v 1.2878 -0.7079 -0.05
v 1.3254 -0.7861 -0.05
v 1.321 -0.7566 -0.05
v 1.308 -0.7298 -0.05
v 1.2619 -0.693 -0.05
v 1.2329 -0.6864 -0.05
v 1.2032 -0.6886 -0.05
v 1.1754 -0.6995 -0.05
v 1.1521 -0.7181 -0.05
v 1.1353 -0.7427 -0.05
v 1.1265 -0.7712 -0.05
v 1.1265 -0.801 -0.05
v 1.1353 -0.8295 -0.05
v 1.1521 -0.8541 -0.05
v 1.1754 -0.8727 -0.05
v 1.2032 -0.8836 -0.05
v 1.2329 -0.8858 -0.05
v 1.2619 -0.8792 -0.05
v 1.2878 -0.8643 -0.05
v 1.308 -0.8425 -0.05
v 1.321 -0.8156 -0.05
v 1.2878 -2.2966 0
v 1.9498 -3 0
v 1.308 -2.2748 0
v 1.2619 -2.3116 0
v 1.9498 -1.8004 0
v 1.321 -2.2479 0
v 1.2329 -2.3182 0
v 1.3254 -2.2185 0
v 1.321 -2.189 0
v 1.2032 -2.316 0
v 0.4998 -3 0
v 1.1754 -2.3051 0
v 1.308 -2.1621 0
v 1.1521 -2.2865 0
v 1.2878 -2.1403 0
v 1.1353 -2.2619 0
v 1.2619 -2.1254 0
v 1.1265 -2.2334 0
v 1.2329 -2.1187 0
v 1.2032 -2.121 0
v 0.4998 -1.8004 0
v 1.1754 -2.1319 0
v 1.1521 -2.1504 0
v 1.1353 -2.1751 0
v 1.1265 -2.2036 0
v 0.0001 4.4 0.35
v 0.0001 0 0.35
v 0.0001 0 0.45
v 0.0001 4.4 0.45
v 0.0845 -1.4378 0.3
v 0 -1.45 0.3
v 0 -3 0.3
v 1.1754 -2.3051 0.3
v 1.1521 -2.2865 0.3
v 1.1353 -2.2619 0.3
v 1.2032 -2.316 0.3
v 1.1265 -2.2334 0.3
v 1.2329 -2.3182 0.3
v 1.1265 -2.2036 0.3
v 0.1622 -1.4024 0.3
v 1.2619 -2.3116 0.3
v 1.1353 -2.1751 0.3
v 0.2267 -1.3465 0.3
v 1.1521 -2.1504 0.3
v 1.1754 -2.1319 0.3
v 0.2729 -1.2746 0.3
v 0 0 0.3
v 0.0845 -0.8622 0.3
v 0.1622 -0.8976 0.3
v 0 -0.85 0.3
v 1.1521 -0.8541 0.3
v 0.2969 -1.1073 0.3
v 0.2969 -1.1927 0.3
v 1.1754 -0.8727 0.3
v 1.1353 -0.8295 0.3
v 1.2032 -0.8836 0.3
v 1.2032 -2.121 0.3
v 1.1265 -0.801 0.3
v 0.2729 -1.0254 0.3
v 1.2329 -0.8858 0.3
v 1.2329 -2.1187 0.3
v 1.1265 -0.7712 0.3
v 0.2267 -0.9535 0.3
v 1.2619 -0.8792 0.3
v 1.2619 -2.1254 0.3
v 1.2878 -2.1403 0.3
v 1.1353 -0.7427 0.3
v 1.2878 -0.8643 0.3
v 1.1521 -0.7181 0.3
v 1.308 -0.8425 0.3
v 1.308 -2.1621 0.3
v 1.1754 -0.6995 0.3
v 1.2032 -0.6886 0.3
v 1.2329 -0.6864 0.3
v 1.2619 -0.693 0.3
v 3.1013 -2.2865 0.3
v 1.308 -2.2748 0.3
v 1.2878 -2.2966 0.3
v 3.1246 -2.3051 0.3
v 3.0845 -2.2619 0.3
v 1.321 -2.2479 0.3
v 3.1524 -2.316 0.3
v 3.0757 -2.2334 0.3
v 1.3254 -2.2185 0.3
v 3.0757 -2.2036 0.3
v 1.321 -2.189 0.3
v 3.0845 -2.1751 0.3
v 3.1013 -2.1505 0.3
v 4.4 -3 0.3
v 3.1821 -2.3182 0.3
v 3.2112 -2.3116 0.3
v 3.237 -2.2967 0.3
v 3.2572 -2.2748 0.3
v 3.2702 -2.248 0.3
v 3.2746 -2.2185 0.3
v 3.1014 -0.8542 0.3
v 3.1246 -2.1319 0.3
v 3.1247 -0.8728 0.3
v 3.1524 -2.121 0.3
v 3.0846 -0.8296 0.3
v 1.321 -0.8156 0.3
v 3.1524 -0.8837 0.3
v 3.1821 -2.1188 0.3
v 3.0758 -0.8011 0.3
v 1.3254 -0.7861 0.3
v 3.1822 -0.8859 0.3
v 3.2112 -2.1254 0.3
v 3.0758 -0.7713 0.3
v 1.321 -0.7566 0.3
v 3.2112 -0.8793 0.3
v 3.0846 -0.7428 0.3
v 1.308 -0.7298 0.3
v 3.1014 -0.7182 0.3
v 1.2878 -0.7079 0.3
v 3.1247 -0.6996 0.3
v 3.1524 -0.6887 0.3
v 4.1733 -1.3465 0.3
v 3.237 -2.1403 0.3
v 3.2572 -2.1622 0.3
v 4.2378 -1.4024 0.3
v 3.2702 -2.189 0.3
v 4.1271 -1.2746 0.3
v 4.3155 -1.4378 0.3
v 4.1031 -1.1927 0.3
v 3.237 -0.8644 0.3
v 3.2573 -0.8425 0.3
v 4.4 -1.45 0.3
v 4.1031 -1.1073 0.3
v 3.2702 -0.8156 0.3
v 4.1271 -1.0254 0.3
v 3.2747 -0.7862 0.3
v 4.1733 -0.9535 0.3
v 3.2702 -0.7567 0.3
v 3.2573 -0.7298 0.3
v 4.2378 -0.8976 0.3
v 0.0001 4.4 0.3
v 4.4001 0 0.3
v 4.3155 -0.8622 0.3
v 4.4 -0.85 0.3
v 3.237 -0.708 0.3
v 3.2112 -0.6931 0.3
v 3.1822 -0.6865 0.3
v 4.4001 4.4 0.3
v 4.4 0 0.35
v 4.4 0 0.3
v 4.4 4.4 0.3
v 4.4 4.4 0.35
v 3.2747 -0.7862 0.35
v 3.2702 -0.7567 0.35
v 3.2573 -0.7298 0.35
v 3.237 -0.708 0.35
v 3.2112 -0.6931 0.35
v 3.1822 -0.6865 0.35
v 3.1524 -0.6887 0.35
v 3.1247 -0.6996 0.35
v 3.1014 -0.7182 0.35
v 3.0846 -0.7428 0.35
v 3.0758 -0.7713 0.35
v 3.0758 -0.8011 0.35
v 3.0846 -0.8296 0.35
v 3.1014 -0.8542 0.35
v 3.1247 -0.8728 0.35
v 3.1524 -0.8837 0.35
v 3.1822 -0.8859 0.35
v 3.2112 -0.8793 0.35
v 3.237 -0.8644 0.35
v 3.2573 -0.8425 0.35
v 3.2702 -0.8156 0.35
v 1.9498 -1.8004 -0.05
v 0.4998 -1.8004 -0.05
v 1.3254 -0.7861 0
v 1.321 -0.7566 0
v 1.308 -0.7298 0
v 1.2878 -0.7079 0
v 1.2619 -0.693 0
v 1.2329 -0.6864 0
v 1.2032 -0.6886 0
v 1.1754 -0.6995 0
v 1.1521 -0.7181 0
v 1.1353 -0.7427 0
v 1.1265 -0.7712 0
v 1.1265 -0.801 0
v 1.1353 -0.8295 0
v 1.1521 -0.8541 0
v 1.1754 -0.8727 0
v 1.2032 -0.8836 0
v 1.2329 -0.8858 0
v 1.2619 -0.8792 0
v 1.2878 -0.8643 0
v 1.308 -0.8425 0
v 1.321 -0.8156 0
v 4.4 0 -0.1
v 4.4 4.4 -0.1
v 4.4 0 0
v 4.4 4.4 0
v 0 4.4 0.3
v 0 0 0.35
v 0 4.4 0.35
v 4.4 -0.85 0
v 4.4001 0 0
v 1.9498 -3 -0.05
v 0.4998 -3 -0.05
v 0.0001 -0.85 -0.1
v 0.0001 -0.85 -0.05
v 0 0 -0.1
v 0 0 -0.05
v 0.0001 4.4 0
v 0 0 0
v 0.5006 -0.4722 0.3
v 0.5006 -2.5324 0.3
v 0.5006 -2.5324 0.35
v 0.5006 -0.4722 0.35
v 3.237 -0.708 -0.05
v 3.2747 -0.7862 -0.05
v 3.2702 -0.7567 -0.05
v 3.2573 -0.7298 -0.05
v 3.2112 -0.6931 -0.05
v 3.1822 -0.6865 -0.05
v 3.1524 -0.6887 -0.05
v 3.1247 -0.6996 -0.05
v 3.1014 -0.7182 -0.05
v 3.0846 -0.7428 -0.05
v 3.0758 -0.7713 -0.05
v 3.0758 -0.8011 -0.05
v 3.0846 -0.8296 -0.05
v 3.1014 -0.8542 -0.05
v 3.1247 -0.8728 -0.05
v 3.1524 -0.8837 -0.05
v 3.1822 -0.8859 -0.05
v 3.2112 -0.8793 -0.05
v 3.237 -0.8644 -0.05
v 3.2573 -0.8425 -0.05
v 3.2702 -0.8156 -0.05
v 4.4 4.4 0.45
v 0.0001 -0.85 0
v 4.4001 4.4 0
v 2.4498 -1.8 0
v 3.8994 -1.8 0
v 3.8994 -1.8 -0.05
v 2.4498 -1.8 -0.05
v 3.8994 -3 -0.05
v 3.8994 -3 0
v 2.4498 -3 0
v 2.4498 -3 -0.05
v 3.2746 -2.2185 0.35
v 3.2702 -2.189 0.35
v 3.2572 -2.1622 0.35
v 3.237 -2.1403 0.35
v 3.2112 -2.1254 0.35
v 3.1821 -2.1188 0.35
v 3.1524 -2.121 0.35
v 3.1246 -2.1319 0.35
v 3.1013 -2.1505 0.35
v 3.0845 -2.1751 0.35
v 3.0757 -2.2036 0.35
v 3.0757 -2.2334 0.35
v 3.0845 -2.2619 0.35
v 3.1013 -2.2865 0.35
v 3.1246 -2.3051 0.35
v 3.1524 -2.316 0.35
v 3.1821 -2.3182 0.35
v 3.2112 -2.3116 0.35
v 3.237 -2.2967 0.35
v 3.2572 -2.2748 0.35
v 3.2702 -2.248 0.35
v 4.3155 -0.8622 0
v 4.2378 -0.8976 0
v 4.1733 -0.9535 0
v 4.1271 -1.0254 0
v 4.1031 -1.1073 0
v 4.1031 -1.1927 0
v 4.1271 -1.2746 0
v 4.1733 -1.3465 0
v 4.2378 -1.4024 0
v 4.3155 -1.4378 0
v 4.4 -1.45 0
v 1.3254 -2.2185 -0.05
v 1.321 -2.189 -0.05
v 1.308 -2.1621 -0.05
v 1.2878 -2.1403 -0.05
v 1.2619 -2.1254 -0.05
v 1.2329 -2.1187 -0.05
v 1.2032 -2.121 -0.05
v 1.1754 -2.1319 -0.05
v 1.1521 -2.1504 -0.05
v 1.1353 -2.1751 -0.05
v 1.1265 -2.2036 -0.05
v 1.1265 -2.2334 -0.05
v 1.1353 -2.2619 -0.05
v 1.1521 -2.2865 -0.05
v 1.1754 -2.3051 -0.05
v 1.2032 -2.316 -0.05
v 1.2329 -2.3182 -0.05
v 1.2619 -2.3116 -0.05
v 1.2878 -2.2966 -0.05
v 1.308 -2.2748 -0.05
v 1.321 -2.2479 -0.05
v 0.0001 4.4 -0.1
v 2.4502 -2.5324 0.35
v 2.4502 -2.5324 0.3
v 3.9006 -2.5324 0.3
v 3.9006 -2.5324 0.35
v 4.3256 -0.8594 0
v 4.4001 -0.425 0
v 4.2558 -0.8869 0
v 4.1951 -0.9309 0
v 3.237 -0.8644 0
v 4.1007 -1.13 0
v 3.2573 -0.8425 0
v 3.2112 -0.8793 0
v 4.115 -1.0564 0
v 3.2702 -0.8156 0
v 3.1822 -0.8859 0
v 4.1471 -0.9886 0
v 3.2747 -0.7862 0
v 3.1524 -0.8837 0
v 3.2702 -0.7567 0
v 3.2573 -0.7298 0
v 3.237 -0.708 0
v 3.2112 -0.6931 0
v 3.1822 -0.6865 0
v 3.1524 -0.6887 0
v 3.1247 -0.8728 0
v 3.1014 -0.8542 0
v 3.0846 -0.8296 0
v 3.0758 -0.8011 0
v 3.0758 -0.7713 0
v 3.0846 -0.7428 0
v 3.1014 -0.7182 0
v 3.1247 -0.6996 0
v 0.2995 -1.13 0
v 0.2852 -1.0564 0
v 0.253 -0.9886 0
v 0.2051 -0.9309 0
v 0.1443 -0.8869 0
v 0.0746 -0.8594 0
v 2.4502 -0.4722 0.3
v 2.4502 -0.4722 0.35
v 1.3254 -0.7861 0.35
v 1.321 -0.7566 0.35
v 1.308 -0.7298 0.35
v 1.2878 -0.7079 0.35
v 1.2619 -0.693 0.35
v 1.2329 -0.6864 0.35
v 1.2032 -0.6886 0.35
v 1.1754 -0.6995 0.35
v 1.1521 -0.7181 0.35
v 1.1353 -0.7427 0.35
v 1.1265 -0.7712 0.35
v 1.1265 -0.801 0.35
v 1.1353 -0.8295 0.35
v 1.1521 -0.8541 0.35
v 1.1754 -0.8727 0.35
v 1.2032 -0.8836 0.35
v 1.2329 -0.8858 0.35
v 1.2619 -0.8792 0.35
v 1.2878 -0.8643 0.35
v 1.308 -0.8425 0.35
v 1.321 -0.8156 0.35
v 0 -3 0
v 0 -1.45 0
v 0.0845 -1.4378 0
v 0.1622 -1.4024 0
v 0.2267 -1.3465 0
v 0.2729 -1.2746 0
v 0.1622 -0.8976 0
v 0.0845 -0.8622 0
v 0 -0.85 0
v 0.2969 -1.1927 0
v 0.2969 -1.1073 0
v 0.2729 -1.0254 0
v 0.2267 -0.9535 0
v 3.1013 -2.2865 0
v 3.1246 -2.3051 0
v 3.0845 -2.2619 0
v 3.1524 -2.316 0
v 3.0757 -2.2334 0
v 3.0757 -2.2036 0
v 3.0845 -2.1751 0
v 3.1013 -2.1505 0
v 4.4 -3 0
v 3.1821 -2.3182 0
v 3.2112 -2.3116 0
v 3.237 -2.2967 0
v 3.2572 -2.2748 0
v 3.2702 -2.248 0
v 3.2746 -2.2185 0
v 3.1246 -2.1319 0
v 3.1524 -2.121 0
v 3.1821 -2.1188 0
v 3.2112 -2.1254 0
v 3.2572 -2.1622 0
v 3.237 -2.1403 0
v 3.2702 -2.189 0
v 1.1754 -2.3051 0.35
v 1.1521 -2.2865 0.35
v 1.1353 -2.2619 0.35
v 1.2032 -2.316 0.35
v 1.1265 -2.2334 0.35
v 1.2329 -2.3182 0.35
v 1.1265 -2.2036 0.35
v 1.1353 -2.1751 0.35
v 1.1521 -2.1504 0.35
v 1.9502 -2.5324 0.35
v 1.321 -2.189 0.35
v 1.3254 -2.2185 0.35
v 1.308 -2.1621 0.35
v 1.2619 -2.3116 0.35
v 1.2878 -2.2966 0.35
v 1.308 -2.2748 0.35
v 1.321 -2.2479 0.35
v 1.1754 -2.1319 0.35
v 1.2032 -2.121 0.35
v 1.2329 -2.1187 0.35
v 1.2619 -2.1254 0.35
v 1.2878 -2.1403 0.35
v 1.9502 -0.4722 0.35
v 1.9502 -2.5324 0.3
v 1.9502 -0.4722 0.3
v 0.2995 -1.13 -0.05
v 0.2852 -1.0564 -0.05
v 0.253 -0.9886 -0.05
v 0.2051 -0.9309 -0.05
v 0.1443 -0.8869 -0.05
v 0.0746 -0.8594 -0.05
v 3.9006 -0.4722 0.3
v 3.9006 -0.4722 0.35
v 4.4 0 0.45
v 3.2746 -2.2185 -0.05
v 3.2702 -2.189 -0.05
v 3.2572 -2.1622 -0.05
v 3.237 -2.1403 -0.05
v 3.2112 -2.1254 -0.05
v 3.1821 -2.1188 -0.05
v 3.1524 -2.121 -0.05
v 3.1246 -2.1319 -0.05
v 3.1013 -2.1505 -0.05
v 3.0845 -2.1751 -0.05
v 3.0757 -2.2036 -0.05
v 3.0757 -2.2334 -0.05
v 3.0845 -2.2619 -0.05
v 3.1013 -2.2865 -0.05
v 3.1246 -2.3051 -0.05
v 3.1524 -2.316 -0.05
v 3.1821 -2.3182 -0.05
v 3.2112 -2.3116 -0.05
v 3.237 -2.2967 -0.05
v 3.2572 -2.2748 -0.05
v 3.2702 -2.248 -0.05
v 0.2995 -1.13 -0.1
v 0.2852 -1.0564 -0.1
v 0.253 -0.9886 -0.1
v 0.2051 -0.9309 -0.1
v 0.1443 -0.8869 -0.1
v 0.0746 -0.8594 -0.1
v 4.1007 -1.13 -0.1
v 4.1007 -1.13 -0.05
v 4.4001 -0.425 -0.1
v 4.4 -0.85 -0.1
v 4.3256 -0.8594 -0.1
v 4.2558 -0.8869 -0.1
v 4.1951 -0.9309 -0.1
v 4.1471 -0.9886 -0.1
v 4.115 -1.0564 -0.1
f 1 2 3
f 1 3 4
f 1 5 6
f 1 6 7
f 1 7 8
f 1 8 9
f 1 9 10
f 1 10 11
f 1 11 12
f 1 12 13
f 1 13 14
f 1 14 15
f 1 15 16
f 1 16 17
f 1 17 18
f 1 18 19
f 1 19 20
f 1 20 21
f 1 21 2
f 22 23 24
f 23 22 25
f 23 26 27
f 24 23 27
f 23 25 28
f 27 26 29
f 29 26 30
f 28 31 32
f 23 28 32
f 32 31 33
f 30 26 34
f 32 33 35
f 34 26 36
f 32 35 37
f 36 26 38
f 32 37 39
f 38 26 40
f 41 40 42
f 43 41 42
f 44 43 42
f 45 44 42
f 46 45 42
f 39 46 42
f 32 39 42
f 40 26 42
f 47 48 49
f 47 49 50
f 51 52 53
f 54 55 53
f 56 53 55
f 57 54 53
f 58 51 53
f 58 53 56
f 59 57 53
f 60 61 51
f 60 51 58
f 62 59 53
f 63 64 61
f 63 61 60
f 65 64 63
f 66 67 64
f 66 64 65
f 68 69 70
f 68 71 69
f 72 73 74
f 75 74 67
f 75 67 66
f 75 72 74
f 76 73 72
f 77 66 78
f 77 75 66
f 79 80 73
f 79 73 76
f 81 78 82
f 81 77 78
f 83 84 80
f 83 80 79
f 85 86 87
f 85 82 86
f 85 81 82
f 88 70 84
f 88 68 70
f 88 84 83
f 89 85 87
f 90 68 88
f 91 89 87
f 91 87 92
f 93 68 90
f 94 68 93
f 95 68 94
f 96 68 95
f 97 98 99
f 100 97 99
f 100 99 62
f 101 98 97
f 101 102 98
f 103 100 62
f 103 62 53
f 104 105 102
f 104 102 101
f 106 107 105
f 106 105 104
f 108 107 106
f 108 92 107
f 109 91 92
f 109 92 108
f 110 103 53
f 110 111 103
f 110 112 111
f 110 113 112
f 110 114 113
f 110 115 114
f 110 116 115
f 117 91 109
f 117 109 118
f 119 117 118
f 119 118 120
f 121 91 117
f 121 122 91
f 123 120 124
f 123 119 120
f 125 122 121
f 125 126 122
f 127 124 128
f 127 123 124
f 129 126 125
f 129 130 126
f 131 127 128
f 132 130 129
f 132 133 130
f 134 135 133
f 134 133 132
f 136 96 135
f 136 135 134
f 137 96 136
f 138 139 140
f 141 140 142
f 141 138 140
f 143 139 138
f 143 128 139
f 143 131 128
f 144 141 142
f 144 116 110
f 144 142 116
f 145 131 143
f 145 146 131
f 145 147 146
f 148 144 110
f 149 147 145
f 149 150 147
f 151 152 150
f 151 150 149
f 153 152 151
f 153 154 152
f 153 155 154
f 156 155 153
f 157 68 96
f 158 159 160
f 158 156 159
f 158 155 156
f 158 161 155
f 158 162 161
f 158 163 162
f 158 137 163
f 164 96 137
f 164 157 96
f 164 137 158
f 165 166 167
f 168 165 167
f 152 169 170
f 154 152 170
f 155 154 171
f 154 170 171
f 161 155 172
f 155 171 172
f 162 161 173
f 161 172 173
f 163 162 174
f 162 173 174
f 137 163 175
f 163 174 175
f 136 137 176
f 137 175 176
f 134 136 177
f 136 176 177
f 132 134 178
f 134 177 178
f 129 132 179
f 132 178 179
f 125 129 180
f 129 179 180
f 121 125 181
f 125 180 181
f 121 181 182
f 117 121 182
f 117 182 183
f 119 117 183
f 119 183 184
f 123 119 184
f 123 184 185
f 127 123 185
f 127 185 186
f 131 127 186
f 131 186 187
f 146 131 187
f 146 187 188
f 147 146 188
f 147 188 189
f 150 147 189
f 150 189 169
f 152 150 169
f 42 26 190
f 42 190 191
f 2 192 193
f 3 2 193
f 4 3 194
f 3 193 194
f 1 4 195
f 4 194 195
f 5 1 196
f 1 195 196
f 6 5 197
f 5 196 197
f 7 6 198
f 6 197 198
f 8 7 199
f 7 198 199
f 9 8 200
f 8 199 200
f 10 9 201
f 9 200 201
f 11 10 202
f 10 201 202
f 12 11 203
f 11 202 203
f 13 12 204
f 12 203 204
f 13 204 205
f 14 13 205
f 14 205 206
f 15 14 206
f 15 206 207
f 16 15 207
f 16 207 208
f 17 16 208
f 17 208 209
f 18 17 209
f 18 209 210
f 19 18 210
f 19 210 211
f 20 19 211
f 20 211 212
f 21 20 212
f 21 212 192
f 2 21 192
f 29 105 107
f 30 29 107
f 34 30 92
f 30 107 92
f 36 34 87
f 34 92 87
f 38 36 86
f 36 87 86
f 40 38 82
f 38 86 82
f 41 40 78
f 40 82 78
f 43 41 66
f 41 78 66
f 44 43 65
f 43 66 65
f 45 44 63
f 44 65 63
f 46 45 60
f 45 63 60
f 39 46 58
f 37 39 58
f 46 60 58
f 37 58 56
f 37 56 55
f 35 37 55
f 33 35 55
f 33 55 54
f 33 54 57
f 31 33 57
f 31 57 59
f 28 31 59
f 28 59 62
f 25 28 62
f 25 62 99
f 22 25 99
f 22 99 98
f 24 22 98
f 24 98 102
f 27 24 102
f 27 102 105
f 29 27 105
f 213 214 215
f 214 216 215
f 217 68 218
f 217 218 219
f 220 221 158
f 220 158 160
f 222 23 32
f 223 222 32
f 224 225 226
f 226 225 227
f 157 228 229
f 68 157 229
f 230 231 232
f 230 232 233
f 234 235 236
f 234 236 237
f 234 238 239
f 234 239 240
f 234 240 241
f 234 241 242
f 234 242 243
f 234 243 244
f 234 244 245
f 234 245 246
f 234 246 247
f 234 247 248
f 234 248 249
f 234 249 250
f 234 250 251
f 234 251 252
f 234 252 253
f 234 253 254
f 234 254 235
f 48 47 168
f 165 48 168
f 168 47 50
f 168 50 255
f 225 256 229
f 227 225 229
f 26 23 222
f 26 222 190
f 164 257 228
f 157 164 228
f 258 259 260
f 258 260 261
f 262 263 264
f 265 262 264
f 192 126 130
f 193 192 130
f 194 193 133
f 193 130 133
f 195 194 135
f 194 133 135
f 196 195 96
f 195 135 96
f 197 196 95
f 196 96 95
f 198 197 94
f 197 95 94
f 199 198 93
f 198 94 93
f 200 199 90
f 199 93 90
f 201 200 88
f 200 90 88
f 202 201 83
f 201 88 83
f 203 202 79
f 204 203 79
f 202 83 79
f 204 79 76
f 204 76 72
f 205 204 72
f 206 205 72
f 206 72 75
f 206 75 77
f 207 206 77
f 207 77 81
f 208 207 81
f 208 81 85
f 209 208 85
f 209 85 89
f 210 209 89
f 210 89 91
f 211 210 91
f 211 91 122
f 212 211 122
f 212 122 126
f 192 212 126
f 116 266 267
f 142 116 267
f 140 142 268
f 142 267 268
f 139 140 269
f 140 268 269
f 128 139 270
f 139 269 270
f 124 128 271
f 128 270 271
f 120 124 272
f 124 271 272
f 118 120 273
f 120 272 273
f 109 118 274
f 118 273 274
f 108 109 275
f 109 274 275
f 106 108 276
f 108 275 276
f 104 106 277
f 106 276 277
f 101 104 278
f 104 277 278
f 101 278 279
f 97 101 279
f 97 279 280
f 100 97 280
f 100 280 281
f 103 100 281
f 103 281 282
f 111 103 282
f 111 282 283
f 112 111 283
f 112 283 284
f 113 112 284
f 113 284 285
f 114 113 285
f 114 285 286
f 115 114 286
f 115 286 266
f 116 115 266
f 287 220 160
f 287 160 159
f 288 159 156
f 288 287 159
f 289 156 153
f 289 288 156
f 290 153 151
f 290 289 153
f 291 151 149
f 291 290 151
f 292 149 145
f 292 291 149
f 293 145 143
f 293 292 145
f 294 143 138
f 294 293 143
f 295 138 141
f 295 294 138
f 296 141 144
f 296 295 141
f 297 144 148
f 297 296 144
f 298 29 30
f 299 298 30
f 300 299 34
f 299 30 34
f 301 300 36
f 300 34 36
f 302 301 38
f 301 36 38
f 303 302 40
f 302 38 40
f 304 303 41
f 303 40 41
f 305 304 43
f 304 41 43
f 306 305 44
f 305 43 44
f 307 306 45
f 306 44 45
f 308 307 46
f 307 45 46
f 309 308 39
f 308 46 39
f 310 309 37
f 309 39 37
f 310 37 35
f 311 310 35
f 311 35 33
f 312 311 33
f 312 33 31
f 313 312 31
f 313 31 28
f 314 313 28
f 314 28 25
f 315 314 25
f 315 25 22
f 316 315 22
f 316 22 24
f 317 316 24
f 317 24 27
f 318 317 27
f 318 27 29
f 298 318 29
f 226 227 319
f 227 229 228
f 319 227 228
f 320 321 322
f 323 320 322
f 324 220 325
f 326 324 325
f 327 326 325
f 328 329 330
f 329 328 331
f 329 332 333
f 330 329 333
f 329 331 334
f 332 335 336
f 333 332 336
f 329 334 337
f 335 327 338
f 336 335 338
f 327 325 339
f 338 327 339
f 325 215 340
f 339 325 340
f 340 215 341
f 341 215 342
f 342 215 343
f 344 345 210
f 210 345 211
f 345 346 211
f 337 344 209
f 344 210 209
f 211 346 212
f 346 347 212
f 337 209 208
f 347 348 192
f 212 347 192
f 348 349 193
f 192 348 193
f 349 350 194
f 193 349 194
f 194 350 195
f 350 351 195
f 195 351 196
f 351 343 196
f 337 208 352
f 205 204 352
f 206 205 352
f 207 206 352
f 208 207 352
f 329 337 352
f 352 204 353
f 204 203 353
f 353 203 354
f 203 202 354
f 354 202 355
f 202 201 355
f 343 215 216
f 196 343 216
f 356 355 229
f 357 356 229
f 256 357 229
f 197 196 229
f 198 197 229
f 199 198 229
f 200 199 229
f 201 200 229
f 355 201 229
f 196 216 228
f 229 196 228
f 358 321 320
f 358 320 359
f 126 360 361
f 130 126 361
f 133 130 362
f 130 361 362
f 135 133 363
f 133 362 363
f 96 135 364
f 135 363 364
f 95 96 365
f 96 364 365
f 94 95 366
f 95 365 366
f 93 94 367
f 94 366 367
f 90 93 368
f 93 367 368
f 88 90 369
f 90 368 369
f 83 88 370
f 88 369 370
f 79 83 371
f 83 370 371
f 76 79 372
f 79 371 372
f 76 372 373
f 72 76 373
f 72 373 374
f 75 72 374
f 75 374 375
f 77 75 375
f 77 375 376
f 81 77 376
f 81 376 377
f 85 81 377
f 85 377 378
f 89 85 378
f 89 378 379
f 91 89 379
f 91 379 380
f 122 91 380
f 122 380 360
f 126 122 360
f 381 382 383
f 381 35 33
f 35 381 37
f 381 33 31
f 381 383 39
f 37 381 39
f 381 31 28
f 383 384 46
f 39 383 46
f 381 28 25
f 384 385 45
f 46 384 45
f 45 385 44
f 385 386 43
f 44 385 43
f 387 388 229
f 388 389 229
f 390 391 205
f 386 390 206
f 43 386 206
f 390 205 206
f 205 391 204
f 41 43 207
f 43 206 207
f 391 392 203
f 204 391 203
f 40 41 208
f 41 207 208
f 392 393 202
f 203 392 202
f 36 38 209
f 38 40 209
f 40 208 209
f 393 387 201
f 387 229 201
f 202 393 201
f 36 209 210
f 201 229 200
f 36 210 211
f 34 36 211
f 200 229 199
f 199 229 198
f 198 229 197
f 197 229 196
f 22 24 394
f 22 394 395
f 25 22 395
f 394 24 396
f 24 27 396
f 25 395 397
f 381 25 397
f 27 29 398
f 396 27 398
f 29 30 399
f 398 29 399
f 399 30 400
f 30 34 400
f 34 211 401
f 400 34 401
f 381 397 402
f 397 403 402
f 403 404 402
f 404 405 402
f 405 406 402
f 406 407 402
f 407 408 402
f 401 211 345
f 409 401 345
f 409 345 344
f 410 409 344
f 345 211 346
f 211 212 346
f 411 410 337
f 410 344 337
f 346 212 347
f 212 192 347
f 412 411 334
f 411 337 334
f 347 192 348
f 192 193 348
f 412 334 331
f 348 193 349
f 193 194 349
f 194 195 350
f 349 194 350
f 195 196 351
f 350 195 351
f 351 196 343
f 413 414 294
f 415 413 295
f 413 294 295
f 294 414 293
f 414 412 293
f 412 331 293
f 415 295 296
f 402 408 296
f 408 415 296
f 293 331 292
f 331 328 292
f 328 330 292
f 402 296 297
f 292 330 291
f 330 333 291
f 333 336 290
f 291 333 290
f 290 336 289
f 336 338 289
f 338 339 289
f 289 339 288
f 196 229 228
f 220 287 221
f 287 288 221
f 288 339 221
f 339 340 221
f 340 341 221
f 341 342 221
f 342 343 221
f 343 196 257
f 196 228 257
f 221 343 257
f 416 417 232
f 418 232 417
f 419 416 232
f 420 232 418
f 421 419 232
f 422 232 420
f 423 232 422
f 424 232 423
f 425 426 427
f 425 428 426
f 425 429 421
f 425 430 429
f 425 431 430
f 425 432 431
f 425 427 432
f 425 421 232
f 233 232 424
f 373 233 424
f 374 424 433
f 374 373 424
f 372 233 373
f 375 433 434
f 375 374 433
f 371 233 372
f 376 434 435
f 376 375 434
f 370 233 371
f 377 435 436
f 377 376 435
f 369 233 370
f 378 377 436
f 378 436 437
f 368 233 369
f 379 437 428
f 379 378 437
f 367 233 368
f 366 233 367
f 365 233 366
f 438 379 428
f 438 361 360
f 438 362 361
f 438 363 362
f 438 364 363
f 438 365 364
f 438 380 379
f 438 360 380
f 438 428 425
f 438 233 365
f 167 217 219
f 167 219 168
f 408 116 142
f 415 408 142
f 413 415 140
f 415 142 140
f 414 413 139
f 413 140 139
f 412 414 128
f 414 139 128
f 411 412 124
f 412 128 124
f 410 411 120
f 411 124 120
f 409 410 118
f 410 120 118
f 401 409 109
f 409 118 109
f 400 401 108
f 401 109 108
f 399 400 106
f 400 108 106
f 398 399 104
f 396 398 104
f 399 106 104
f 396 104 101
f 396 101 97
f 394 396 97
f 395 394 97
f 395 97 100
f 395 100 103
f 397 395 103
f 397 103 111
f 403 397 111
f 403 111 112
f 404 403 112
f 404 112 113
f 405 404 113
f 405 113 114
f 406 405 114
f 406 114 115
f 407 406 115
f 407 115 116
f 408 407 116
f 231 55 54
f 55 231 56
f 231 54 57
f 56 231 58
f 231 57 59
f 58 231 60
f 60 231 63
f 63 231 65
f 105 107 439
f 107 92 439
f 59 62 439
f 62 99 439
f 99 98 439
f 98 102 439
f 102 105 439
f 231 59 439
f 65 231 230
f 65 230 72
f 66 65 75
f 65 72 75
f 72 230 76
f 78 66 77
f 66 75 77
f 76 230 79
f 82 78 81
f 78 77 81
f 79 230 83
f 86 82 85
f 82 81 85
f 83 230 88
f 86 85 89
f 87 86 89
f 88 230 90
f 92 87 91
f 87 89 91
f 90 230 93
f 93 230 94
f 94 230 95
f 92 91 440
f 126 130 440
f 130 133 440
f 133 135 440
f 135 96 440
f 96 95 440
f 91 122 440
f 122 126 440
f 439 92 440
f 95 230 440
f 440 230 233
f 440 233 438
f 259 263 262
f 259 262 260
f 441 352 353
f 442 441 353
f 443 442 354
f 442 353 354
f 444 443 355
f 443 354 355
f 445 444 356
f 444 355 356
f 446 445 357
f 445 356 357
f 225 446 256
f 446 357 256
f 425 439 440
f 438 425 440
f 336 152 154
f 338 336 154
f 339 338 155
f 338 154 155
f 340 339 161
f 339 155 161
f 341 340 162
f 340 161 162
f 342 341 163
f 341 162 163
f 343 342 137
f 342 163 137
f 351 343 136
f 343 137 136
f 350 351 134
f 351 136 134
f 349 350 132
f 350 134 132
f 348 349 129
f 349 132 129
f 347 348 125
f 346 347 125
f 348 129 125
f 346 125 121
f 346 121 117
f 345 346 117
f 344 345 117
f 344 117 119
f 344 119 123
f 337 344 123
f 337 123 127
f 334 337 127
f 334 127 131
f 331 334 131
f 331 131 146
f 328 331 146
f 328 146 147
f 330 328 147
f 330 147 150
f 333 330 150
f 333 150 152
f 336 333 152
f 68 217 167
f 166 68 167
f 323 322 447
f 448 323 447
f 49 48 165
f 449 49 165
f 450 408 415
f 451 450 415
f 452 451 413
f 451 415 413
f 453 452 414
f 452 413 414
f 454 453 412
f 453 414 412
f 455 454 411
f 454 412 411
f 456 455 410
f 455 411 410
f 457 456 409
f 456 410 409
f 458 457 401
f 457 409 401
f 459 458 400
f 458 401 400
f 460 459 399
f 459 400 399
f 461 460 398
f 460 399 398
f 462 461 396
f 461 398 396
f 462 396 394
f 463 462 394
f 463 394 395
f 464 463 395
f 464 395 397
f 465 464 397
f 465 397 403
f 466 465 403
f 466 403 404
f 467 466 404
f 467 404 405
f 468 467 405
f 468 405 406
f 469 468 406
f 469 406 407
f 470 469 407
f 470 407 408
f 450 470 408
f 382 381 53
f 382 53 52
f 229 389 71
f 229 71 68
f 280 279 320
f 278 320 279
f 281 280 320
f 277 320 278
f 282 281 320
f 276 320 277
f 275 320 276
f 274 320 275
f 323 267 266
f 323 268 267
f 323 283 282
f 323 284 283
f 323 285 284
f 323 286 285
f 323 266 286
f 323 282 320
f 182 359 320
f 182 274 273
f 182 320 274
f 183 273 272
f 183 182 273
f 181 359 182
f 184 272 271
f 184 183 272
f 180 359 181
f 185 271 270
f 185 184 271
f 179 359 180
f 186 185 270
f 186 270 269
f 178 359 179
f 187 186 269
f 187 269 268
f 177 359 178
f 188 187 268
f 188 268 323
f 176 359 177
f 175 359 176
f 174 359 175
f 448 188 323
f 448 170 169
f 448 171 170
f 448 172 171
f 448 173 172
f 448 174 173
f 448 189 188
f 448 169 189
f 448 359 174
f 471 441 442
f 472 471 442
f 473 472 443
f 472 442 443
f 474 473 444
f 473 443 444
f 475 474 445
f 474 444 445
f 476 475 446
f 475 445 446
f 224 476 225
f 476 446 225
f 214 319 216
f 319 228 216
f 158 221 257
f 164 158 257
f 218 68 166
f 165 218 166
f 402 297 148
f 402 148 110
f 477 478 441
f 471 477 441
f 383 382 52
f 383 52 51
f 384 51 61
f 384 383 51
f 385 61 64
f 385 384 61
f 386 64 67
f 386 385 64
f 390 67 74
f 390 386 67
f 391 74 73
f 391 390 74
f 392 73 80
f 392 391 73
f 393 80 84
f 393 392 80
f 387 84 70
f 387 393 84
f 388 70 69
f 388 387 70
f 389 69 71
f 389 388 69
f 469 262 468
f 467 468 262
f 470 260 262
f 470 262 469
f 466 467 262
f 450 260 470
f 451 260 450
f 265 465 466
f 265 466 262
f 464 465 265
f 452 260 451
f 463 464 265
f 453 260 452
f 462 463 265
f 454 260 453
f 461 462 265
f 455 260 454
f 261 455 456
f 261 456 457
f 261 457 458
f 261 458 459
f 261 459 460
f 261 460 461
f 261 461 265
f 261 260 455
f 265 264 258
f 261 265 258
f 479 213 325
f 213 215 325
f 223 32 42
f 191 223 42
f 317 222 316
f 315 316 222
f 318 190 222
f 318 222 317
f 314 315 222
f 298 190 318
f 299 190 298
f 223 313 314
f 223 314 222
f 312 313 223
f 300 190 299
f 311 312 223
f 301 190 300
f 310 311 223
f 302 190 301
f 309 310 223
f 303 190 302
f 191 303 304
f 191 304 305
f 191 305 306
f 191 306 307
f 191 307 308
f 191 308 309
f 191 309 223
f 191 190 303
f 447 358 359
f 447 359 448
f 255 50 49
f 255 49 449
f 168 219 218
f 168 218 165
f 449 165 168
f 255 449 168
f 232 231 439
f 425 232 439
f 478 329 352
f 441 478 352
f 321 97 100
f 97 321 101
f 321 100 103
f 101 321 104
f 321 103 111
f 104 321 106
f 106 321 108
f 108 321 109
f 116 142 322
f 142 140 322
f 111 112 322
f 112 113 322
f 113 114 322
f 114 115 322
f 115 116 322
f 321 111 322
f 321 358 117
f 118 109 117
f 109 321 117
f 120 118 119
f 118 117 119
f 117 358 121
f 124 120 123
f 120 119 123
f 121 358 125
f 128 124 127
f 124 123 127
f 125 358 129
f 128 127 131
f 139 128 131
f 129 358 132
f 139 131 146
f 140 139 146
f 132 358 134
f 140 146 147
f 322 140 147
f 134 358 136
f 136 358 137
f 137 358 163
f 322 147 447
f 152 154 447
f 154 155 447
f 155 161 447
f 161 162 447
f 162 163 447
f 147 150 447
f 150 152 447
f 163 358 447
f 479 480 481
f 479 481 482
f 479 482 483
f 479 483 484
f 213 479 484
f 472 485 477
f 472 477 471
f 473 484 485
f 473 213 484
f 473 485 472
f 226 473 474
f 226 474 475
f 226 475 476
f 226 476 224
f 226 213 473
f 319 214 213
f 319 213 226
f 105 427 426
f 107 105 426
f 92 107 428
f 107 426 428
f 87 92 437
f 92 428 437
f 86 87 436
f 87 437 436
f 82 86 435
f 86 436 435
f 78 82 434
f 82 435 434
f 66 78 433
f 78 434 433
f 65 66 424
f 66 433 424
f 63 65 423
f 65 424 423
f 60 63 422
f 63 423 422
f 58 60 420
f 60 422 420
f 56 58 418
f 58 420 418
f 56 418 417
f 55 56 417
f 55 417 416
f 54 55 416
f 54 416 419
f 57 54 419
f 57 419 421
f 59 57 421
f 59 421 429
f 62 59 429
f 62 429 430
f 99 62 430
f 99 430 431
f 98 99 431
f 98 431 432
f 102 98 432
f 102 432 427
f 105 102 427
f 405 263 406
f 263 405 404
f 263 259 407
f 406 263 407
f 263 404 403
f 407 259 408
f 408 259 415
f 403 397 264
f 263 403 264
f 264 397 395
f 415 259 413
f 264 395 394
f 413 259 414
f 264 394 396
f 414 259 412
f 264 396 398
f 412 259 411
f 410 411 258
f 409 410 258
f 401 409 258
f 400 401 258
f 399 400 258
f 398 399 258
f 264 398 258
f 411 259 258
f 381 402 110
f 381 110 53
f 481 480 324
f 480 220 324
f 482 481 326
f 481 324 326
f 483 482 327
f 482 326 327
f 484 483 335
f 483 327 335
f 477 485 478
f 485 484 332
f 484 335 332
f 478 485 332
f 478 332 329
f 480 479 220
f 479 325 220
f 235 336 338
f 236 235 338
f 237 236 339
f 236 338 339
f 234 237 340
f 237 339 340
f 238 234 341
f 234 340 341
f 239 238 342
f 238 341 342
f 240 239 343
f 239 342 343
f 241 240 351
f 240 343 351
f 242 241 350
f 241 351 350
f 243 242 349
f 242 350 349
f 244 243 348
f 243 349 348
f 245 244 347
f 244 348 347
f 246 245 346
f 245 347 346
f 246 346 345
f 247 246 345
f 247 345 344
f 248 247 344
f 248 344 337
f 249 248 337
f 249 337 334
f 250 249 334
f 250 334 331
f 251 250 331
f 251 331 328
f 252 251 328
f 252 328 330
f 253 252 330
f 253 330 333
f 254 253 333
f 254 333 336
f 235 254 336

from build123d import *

# Parameters (mm, degrees)
BOSS_EXTRUDE1_DEPTH   = 0.3
BOSS_EXTRUDE2_DEPTH   = 0.05
SKETCH2_W             = 1.449629897
SKETCH2_H             = 1.2
BOSS_EXTRUDE2_2_DEPTH = 0.05
SKETCH2_W_2           = 1.45
SKETCH2_H_2           = 1.199587339
BOSS_EXTRUDE2_3_DEPTH = 0.05
BOSS_EXTRUDE3_DEPTH   = 0.05
SKETCH4_W             = 1.45037802
SKETCH4_H             = 2.060210665
BOSS_EXTRUDE4_DEPTH   = 0.05
SKETCH4_W_2           = 1.449629897
BOSS_EXTRUDE4_2_DEPTH = 0.05
SKETCH4_W_3           = 4.4
SKETCH4_H_2           = 4.4
BOSS_EXTRUDE4_3_DEPTH = 0.05
SKETCH6_W             = 4.399859889
SKETCH6_H             = 4.4
BOSS_EXTRUDE5_DEPTH   = 0.1
SKETCH7_R             = 0.1
CUT_EXTRUDE1_DEPTH    = 0.4


with BuildPart() as part:
    # Model → Boss-Extrude1 (new body)
    with BuildSketch(Plane.XY):
        Polygon((0.000140111, 4.4), (0, 0), (4.400140111, 0), (4.400140111, 4.4), align=None)
        with BuildLine():
            ThreePointArc((4.4, -0.85), (4.1, -1.15), (4.4, -1.45))
            Line((4.4, -1.45), (4.4, -3))
            Line((4.4, -3), (0, -3))
            Line((0, -3), (0, -1.45))
            ThreePointArc((0, -1.45), (0.3, -1.15), (0, -0.85))
            Line((0, -0.85), (0, 0))
            Line((0, 0), (4.400140111, 0))
            Line((4.400140111, 0), (4.4, -0.85))
        make_face()
    extrude(amount=BOSS_EXTRUDE1_DEPTH)


with BuildPart() as body_2:
    # Sketch2 → Boss-Extrude2 (new body)
    with BuildSketch(Plane(origin=(0, 0, 0), x_dir=(-1, 0, 0), z_dir=(0, 0, -1))):
        with BuildLine():
            Line((-4.100667409, -1.13), (-0.299472702, -1.13))
            ThreePointArc((-0.299472702, -1.13), (-0.205079126, -0.930910977), (-0.000140111, -0.85))
            Line((-0.000140111, -0.85), (0, 0))
            Line((0, 0), (-0.000140111, 4.4))
            Line((-0.000140111, 4.4), (-4.4, 4.4))
            Line((-4.4, 4.4), (-4.4, 0))
            Line((-4.4, 0), (-4.400070055, -0.425))
            Line((-4.400070055, -0.425), (-4.4, -0.85))
            ThreePointArc((-4.4, -0.85), (-4.195060985, -0.930910977), (-4.100667409, -1.13))
        make_face()
    extrude(amount=BOSS_EXTRUDE2_DEPTH)

    # Sketch3 → Boss-Extrude3 (add)
    with BuildSketch(Plane(origin=(0, 0, -0.05), x_dir=(-1, 0, 0), z_dir=(0, 0, -1))):
        with BuildLine():
            Line((-0.000140111, -0.850000016), (0, 0))
            Line((0, 0), (-0.000140111, 4.4))
            Line((-0.000140111, 4.4), (-4.4, 4.4))
            Line((-4.4, 4.4), (-4.4, 0))
            Line((-4.4, 0), (-4.400070055, -0.425))
            Line((-4.400070055, -0.425), (-4.4, -0.85))
            ThreePointArc((-4.4, -0.85), (-4.195060985, -0.930910977), (-4.100667409, -1.13))
            Line((-4.100667409, -1.13), (-0.299472685, -1.130000001))
            ThreePointArc((-0.299472685, -1.130000001), (-0.205079115, -0.930910989), (-0.000140111, -0.850000016))
        make_face()
    extrude(amount=BOSS_EXTRUDE3_DEPTH)


with BuildPart() as body_3:
    # Sketch2 → Boss-Extrude2 2 (new body)
    with BuildSketch(Plane(origin=(0, 0, 0), x_dir=(-1, 0, 0), z_dir=(0, 0, -1))):
        with Locations((-3.174585387, -2.4)):
            Rectangle(SKETCH2_W, SKETCH2_H)
    extrude(amount=BOSS_EXTRUDE2_2_DEPTH)


with BuildPart() as body_4:
    # Sketch2 → Boss-Extrude2 3 (new body)
    with BuildSketch(Plane(origin=(0, 0, 0), x_dir=(-1, 0, 0), z_dir=(0, 0, -1))):
        with Locations((-1.224770438, -2.400206331)):
            Rectangle(SKETCH2_W_2, SKETCH2_H_2)
    extrude(amount=BOSS_EXTRUDE2_3_DEPTH)


with BuildPart() as body_5:
    # Sketch4 → Boss-Extrude4 (new body)
    with BuildSketch(Plane.XY.offset(0.3)):
        with Locations((3.175418572, -1.502294159)):
            Rectangle(SKETCH4_W, SKETCH4_H)
    extrude(amount=BOSS_EXTRUDE4_DEPTH)


with BuildPart() as body_6:
    # Sketch4 → Boss-Extrude4 2 (new body)
    with BuildSketch(Plane.XY.offset(0.3)):
        with Locations((1.225414614, -1.502294159)):
            Rectangle(SKETCH4_W_2, SKETCH4_H)
    extrude(amount=BOSS_EXTRUDE4_2_DEPTH)


with BuildPart() as body_7:
    # Sketch4 → Boss-Extrude4 3 (new body)
    with BuildSketch(Plane.XY.offset(0.3)):
        with Locations((2.2, 2.2)):
            Rectangle(SKETCH4_W_3, SKETCH4_H_2)
    extrude(amount=BOSS_EXTRUDE4_3_DEPTH)


with BuildPart() as body_8:
    # Sketch6 → Boss-Extrude5 (new body)
    with BuildSketch(Plane.XY.offset(0.35)):
        with Locations((2.200070056, 2.2)):
            Rectangle(SKETCH6_W, SKETCH6_H)
    extrude(amount=BOSS_EXTRUDE5_DEPTH)


with BuildPart() as cut_extrude1_tool:
    # Sketch7 → Cut-Extrude1 (new body)
    with BuildSketch(Plane.XY.offset(0.35)):
        with Locations((1.225414614, -0.786125011)):
            Circle(SKETCH7_R)
        with Locations((1.225414614, -2.218463306)):
            Circle(SKETCH7_R)
        with Locations((3.174621886, -2.218508824)):
            Circle(SKETCH7_R)
        with Locations((3.174688781, -0.78617053)):
            Circle(SKETCH7_R)
    extrude(amount=-CUT_EXTRUDE1_DEPTH)


with BuildPart() as part_1:
    add(part.part)

    # Cut-Extrude1: cut by cut_extrude1_tool
    add(cut_extrude1_tool.part, mode=Mode.SUBTRACT)


with BuildPart() as body_2_1:
    add(body_2.part)

    # Cut-Extrude1: cut by cut_extrude1_tool
    add(cut_extrude1_tool.part, mode=Mode.SUBTRACT)


with BuildPart() as body_3_1:
    add(body_3.part)

    # Cut-Extrude1: cut by cut_extrude1_tool
    add(cut_extrude1_tool.part, mode=Mode.SUBTRACT)


with BuildPart() as body_4_1:
    add(body_4.part)

    # Cut-Extrude1: cut by cut_extrude1_tool
    add(cut_extrude1_tool.part, mode=Mode.SUBTRACT)


with BuildPart() as body_5_1:
    add(body_5.part)

    # Cut-Extrude1: cut by cut_extrude1_tool
    add(cut_extrude1_tool.part, mode=Mode.SUBTRACT)


with BuildPart() as body_6_1:
    add(body_6.part)

    # Cut-Extrude1: cut by cut_extrude1_tool
    add(cut_extrude1_tool.part, mode=Mode.SUBTRACT)


solid = Compound([body_7.part, body_8.part, part_1.part, body_2_1.part, body_3_1.part, body_4_1.part, body_5_1.part, body_6_1.part])
